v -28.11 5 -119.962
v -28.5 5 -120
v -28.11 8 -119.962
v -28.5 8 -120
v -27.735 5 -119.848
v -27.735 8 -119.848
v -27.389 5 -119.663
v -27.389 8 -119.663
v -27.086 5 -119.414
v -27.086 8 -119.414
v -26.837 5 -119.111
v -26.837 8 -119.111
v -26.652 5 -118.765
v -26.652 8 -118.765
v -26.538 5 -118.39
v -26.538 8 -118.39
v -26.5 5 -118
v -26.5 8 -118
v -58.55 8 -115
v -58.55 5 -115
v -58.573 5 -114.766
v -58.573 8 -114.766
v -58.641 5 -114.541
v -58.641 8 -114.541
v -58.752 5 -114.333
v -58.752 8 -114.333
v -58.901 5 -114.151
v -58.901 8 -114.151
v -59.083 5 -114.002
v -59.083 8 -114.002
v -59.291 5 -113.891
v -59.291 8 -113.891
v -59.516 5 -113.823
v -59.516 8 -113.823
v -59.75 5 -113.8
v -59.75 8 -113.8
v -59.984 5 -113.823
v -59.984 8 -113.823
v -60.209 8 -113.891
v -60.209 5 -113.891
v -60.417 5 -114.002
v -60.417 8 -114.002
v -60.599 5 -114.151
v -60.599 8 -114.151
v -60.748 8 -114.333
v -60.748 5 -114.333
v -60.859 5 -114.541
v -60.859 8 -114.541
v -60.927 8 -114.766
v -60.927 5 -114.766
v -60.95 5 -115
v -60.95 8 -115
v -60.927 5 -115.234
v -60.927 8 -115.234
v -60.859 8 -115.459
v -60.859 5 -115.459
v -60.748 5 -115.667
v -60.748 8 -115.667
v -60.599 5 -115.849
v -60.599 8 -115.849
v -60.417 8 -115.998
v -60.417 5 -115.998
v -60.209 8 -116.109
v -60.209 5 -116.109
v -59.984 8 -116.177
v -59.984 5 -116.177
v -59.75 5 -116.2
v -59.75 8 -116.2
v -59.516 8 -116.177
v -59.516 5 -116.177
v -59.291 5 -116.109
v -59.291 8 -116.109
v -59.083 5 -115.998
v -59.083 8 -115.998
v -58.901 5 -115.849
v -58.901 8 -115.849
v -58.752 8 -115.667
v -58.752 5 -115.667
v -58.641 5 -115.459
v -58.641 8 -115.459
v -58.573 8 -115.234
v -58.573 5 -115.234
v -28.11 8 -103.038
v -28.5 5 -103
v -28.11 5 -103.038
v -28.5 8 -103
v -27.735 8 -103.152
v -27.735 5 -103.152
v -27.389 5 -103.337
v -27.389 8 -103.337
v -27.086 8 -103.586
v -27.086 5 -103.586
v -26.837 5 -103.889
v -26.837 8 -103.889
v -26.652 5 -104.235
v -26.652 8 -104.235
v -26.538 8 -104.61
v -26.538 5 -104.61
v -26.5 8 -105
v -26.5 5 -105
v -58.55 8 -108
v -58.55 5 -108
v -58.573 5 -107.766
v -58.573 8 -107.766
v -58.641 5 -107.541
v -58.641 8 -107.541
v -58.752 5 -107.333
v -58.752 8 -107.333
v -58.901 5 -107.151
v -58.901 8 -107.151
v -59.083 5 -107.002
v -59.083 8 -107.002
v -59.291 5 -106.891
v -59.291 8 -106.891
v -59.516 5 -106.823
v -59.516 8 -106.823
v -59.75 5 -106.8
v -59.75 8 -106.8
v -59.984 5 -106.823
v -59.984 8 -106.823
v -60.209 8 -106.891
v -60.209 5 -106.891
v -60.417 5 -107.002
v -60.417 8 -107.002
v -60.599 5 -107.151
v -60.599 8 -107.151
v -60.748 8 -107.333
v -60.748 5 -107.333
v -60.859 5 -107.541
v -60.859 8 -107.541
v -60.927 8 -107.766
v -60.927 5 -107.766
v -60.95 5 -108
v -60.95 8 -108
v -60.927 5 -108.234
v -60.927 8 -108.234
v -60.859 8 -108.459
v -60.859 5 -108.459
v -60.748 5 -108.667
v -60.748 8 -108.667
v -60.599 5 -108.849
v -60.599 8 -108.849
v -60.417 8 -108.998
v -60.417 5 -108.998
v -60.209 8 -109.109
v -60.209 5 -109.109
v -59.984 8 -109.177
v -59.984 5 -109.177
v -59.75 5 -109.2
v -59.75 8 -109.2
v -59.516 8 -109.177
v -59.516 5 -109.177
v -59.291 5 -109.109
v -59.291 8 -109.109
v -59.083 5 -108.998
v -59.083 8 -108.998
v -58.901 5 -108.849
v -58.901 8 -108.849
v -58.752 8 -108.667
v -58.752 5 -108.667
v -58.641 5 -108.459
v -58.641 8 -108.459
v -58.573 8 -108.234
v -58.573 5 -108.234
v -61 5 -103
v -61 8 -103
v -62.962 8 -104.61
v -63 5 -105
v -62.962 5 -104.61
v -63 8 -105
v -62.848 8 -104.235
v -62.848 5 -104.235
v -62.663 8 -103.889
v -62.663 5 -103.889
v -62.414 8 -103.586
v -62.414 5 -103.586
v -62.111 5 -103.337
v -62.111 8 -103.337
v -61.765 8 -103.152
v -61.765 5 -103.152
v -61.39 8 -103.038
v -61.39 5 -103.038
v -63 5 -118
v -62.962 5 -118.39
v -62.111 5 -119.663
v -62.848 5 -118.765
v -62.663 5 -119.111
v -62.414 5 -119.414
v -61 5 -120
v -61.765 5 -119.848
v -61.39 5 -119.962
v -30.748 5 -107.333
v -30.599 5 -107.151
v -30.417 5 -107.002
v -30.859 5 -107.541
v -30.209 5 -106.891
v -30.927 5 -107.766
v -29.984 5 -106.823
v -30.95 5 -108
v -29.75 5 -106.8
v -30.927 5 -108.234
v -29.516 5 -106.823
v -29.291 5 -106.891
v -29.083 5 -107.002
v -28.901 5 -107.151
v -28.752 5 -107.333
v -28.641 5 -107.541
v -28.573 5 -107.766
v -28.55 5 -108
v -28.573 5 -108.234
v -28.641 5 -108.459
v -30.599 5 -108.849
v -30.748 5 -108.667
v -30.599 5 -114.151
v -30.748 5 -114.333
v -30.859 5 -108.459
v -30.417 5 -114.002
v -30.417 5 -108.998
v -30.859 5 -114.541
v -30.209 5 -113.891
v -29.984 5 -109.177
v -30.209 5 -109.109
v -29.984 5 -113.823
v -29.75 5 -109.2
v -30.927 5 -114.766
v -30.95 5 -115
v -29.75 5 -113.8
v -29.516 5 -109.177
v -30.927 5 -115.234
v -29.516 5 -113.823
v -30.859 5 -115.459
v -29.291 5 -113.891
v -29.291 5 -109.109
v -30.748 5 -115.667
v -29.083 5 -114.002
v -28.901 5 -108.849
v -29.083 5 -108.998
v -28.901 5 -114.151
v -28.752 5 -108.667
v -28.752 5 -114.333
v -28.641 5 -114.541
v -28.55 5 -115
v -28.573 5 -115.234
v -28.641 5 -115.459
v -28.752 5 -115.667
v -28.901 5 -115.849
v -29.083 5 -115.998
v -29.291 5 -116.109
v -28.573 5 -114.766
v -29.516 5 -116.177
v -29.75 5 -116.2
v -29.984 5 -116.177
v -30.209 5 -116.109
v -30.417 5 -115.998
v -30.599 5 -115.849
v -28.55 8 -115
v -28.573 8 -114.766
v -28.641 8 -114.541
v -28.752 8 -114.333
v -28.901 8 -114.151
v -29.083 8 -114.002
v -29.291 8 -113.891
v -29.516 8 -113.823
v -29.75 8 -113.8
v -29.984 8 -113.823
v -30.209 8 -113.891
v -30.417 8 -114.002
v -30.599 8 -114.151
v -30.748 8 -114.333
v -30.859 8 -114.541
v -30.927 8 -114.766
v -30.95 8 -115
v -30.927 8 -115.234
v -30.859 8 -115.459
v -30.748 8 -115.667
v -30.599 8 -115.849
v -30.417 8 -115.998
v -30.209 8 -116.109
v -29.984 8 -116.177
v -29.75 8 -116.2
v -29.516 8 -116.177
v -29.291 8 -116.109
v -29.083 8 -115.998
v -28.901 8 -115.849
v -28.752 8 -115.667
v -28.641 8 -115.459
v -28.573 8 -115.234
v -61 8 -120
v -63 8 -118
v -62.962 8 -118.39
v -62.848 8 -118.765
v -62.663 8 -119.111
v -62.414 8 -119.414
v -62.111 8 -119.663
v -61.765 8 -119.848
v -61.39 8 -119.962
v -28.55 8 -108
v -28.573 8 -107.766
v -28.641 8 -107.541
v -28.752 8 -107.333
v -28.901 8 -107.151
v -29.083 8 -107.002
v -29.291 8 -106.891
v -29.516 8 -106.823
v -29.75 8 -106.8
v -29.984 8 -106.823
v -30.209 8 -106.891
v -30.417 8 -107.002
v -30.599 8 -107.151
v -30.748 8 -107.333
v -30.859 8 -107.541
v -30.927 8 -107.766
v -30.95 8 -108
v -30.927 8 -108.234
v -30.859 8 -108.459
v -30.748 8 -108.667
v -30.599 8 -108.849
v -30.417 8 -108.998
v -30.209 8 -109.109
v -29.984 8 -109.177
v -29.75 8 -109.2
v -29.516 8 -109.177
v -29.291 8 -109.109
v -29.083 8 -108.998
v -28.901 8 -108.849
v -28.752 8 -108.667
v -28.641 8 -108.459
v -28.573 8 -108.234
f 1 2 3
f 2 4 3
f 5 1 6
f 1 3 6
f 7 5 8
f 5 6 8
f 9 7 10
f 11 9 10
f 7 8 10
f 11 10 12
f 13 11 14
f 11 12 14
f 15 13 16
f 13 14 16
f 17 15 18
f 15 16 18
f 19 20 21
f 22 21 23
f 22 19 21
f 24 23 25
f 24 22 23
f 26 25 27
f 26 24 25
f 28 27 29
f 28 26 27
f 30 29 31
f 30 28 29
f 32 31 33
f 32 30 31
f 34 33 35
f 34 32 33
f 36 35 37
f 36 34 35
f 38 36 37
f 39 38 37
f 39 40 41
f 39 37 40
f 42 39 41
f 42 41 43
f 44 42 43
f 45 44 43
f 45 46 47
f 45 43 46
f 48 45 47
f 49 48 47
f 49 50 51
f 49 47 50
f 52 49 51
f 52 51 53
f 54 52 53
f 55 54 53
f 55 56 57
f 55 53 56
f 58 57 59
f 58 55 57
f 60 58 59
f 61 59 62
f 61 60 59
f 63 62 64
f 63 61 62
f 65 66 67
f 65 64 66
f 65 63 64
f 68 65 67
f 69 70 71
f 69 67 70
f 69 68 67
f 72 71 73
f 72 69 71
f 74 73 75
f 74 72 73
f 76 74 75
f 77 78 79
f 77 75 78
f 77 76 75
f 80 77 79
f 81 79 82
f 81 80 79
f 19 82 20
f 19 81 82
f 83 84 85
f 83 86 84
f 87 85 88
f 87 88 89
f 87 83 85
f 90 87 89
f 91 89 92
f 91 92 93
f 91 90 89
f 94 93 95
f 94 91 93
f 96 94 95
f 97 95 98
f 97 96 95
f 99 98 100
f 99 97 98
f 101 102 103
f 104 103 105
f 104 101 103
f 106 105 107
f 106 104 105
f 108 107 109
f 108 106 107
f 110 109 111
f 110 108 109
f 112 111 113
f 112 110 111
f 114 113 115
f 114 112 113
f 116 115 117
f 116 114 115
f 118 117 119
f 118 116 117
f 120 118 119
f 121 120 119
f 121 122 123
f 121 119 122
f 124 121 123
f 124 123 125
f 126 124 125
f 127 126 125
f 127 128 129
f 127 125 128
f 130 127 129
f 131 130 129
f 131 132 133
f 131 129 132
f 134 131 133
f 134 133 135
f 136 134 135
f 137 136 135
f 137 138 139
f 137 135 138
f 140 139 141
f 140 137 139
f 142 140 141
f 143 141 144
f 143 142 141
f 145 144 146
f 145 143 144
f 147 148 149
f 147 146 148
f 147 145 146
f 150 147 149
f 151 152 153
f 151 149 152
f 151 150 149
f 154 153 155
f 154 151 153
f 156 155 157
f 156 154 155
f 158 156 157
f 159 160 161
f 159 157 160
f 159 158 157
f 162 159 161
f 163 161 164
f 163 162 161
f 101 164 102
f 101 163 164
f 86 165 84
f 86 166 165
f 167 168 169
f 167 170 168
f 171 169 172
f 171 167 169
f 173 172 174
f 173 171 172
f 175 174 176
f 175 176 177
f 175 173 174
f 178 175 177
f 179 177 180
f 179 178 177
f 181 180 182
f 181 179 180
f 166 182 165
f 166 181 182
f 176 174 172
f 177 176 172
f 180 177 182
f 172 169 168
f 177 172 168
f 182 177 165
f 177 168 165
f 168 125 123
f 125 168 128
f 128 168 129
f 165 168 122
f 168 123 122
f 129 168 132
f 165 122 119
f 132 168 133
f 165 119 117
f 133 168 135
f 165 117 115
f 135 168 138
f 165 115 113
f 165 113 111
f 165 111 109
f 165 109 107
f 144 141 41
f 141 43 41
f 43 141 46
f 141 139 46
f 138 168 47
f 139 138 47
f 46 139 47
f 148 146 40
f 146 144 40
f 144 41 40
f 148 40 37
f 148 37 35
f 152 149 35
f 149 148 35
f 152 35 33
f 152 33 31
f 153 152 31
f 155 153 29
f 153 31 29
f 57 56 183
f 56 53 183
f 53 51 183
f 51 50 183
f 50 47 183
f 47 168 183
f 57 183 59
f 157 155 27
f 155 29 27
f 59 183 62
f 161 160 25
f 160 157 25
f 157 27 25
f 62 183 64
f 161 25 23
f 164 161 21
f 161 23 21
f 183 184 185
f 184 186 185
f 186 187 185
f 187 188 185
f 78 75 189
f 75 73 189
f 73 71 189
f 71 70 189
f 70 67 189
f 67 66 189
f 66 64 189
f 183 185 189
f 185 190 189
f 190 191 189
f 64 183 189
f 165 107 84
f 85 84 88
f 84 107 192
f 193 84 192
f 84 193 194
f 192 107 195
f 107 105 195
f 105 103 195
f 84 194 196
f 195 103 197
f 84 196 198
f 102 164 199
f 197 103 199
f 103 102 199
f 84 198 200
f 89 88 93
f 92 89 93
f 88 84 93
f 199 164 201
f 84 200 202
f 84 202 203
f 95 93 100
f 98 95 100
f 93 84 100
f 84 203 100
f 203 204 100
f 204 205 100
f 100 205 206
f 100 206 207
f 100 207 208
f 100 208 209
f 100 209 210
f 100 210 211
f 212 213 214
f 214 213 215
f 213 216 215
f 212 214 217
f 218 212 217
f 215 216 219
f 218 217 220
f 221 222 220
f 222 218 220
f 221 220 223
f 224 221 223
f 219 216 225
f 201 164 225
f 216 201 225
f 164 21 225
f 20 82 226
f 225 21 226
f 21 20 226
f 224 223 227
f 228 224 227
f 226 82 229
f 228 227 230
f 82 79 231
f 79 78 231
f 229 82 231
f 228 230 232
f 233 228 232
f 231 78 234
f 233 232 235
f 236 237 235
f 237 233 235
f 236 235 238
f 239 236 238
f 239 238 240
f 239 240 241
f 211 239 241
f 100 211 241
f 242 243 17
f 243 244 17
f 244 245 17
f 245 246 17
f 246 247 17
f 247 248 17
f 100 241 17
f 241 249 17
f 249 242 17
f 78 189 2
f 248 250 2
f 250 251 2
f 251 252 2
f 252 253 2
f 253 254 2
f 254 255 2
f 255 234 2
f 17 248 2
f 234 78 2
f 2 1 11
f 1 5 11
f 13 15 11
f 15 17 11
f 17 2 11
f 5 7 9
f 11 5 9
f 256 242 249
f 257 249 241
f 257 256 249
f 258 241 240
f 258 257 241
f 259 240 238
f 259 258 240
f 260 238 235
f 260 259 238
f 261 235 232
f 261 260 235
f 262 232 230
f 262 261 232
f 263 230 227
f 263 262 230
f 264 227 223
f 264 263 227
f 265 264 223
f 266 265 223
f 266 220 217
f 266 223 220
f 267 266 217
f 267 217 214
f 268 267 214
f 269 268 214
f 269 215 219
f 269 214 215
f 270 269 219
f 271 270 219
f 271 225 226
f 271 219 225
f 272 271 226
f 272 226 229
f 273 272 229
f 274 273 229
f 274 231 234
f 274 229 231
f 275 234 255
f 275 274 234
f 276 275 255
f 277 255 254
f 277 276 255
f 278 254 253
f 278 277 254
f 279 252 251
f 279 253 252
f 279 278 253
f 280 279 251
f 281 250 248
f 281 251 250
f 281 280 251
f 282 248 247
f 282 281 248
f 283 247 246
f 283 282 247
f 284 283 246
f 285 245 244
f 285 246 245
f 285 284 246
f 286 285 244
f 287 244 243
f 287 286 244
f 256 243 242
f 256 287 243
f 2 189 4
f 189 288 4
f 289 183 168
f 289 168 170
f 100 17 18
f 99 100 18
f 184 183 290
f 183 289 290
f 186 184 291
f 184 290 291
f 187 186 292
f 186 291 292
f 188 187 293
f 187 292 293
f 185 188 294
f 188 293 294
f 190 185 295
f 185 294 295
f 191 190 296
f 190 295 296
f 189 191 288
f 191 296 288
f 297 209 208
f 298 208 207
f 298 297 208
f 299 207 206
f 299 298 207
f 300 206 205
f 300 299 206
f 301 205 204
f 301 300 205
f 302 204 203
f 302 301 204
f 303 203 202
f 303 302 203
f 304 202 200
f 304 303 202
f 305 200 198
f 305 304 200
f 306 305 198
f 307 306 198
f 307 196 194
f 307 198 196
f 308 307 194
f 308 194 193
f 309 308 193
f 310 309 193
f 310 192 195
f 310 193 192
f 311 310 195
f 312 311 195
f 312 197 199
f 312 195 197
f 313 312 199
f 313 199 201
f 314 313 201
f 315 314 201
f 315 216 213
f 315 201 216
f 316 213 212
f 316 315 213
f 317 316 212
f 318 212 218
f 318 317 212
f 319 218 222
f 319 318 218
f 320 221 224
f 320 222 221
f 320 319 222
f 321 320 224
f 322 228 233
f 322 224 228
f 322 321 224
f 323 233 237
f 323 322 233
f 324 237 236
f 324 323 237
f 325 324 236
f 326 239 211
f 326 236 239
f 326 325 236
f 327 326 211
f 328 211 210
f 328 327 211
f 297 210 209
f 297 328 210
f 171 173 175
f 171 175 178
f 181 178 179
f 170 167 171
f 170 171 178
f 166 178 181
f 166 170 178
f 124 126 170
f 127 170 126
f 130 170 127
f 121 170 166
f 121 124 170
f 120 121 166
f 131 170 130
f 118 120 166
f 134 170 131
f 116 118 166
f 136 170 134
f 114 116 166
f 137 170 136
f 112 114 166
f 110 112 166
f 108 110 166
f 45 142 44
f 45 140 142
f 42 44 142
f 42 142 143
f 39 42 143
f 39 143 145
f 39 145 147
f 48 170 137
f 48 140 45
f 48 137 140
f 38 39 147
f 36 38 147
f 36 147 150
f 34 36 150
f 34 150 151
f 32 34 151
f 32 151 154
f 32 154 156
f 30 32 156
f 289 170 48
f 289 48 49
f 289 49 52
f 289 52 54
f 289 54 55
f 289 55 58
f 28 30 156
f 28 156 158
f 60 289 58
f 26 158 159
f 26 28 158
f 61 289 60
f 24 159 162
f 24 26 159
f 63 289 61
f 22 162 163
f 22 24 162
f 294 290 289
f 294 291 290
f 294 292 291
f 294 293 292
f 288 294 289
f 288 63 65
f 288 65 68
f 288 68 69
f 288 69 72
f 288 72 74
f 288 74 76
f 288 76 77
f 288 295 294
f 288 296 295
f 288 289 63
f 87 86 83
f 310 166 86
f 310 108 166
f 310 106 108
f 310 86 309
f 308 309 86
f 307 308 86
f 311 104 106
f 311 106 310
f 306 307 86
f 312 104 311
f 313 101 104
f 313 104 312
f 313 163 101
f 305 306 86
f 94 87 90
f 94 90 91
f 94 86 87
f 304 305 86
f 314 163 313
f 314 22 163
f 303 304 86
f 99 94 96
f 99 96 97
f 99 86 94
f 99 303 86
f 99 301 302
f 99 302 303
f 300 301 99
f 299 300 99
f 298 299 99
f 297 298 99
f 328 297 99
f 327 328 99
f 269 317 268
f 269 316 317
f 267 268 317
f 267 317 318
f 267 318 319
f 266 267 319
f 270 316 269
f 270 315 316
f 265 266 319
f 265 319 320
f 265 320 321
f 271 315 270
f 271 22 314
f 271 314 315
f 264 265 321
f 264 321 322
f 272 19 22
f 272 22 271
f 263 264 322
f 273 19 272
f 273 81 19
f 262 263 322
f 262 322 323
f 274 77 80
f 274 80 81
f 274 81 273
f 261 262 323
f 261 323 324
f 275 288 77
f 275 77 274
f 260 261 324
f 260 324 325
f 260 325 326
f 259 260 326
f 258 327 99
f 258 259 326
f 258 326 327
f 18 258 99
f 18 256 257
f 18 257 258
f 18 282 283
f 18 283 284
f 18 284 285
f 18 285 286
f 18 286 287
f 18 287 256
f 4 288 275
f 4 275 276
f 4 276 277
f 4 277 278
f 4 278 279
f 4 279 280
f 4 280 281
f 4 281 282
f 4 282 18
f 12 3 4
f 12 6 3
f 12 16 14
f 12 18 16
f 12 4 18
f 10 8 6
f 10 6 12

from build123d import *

# Parameters (mm, degrees)
CYLINDER015_R     = 1.2
CYLINDER015_DEPTH = 10
CYLINDER016_R     = 1.2
CYLINDER016_DEPTH = 10
CYLINDER012_R     = 1.2
CYLINDER012_DEPTH = 10
CYLINDER014_R     = 1.2
CYLINDER014_DEPTH = 10
BOX007_W          = 36.5
BOX007_H          = 3
BOX007_DEPTH      = 17
FILLET008_R       = 2


with BuildPart() as m2s002:
    # Cylinder015 → Cylinder015 (new body)
    with BuildSketch(Plane.XZ):
        Circle(CYLINDER015_R)
    extrude(amount=CYLINDER015_DEPTH)


with BuildPart() as fusion018:
    # Cylinder016 → Cylinder016 (new body)
    with BuildSketch(Plane(origin=(30, 0, 0), x_dir=(1, 0, 0), z_dir=(0, -1, 0))):
        Circle(CYLINDER016_R)
    extrude(amount=CYLINDER016_DEPTH)

    # Fusion018: union m2s002
    add(m2s002.part)


with BuildPart() as fusion018_1:
    # Fusion018 placement: moved
    add(fusion018.part.moved(Location((3.25, 0, 7))))


with BuildPart() as m2s:
    # Cylinder012 → Cylinder012 (new body)
    with BuildSketch(Plane.XZ):
        Circle(CYLINDER012_R)
    extrude(amount=CYLINDER012_DEPTH)


with BuildPart() as fusion019:
    # Cylinder014 → Cylinder014 (new body)
    with BuildSketch(Plane(origin=(30, 0, 0), x_dir=(1, 0, 0), z_dir=(0, -1, 0))):
        Circle(CYLINDER014_R)
    extrude(amount=CYLINDER014_DEPTH)

    # Fusion017: union m2s
    add(m2s.part)


with BuildPart() as fusion019_1:
    # Fusion017 placement: moved
    add(fusion019.part.moved(Location((3.25, 0, 0))))

    # Fusion019: union Fusion018
    add(fusion018_1.part)


with BuildPart() as fusion019_2:
    # Fusion019 placement: moved
    add(fusion019_1.part.moved(Location((0, 3, 5))))


with BuildPart() as convertersupport:
    # Box007 → Box007 (new body)
    with BuildSketch(Plane.XY):
        with Locations((18.25, 1.5)):
            Rectangle(BOX007_W, BOX007_H)
    extrude(amount=BOX007_DEPTH)

    # Cut003: cut Fusion019
    add(fusion019_2.part, mode=Mode.SUBTRACT)

    # Fillet008
    fillet008_edges = [convertersupport.edges().sort_by_distance(p)[0] for p in [
        (0, 1.5, 17),
        (0, 1.5, 0),
        (36.5, 1.5, 17),
        (36.5, 1.5, 0),
    ]]
    fillet(fillet008_edges, radius=FILLET008_R)


with BuildPart() as convertersupport_1:
    # Fillet008 placement: moved
    add(convertersupport.part.moved(Location((-63, 5, -120))))


solid = convertersupport_1.part
